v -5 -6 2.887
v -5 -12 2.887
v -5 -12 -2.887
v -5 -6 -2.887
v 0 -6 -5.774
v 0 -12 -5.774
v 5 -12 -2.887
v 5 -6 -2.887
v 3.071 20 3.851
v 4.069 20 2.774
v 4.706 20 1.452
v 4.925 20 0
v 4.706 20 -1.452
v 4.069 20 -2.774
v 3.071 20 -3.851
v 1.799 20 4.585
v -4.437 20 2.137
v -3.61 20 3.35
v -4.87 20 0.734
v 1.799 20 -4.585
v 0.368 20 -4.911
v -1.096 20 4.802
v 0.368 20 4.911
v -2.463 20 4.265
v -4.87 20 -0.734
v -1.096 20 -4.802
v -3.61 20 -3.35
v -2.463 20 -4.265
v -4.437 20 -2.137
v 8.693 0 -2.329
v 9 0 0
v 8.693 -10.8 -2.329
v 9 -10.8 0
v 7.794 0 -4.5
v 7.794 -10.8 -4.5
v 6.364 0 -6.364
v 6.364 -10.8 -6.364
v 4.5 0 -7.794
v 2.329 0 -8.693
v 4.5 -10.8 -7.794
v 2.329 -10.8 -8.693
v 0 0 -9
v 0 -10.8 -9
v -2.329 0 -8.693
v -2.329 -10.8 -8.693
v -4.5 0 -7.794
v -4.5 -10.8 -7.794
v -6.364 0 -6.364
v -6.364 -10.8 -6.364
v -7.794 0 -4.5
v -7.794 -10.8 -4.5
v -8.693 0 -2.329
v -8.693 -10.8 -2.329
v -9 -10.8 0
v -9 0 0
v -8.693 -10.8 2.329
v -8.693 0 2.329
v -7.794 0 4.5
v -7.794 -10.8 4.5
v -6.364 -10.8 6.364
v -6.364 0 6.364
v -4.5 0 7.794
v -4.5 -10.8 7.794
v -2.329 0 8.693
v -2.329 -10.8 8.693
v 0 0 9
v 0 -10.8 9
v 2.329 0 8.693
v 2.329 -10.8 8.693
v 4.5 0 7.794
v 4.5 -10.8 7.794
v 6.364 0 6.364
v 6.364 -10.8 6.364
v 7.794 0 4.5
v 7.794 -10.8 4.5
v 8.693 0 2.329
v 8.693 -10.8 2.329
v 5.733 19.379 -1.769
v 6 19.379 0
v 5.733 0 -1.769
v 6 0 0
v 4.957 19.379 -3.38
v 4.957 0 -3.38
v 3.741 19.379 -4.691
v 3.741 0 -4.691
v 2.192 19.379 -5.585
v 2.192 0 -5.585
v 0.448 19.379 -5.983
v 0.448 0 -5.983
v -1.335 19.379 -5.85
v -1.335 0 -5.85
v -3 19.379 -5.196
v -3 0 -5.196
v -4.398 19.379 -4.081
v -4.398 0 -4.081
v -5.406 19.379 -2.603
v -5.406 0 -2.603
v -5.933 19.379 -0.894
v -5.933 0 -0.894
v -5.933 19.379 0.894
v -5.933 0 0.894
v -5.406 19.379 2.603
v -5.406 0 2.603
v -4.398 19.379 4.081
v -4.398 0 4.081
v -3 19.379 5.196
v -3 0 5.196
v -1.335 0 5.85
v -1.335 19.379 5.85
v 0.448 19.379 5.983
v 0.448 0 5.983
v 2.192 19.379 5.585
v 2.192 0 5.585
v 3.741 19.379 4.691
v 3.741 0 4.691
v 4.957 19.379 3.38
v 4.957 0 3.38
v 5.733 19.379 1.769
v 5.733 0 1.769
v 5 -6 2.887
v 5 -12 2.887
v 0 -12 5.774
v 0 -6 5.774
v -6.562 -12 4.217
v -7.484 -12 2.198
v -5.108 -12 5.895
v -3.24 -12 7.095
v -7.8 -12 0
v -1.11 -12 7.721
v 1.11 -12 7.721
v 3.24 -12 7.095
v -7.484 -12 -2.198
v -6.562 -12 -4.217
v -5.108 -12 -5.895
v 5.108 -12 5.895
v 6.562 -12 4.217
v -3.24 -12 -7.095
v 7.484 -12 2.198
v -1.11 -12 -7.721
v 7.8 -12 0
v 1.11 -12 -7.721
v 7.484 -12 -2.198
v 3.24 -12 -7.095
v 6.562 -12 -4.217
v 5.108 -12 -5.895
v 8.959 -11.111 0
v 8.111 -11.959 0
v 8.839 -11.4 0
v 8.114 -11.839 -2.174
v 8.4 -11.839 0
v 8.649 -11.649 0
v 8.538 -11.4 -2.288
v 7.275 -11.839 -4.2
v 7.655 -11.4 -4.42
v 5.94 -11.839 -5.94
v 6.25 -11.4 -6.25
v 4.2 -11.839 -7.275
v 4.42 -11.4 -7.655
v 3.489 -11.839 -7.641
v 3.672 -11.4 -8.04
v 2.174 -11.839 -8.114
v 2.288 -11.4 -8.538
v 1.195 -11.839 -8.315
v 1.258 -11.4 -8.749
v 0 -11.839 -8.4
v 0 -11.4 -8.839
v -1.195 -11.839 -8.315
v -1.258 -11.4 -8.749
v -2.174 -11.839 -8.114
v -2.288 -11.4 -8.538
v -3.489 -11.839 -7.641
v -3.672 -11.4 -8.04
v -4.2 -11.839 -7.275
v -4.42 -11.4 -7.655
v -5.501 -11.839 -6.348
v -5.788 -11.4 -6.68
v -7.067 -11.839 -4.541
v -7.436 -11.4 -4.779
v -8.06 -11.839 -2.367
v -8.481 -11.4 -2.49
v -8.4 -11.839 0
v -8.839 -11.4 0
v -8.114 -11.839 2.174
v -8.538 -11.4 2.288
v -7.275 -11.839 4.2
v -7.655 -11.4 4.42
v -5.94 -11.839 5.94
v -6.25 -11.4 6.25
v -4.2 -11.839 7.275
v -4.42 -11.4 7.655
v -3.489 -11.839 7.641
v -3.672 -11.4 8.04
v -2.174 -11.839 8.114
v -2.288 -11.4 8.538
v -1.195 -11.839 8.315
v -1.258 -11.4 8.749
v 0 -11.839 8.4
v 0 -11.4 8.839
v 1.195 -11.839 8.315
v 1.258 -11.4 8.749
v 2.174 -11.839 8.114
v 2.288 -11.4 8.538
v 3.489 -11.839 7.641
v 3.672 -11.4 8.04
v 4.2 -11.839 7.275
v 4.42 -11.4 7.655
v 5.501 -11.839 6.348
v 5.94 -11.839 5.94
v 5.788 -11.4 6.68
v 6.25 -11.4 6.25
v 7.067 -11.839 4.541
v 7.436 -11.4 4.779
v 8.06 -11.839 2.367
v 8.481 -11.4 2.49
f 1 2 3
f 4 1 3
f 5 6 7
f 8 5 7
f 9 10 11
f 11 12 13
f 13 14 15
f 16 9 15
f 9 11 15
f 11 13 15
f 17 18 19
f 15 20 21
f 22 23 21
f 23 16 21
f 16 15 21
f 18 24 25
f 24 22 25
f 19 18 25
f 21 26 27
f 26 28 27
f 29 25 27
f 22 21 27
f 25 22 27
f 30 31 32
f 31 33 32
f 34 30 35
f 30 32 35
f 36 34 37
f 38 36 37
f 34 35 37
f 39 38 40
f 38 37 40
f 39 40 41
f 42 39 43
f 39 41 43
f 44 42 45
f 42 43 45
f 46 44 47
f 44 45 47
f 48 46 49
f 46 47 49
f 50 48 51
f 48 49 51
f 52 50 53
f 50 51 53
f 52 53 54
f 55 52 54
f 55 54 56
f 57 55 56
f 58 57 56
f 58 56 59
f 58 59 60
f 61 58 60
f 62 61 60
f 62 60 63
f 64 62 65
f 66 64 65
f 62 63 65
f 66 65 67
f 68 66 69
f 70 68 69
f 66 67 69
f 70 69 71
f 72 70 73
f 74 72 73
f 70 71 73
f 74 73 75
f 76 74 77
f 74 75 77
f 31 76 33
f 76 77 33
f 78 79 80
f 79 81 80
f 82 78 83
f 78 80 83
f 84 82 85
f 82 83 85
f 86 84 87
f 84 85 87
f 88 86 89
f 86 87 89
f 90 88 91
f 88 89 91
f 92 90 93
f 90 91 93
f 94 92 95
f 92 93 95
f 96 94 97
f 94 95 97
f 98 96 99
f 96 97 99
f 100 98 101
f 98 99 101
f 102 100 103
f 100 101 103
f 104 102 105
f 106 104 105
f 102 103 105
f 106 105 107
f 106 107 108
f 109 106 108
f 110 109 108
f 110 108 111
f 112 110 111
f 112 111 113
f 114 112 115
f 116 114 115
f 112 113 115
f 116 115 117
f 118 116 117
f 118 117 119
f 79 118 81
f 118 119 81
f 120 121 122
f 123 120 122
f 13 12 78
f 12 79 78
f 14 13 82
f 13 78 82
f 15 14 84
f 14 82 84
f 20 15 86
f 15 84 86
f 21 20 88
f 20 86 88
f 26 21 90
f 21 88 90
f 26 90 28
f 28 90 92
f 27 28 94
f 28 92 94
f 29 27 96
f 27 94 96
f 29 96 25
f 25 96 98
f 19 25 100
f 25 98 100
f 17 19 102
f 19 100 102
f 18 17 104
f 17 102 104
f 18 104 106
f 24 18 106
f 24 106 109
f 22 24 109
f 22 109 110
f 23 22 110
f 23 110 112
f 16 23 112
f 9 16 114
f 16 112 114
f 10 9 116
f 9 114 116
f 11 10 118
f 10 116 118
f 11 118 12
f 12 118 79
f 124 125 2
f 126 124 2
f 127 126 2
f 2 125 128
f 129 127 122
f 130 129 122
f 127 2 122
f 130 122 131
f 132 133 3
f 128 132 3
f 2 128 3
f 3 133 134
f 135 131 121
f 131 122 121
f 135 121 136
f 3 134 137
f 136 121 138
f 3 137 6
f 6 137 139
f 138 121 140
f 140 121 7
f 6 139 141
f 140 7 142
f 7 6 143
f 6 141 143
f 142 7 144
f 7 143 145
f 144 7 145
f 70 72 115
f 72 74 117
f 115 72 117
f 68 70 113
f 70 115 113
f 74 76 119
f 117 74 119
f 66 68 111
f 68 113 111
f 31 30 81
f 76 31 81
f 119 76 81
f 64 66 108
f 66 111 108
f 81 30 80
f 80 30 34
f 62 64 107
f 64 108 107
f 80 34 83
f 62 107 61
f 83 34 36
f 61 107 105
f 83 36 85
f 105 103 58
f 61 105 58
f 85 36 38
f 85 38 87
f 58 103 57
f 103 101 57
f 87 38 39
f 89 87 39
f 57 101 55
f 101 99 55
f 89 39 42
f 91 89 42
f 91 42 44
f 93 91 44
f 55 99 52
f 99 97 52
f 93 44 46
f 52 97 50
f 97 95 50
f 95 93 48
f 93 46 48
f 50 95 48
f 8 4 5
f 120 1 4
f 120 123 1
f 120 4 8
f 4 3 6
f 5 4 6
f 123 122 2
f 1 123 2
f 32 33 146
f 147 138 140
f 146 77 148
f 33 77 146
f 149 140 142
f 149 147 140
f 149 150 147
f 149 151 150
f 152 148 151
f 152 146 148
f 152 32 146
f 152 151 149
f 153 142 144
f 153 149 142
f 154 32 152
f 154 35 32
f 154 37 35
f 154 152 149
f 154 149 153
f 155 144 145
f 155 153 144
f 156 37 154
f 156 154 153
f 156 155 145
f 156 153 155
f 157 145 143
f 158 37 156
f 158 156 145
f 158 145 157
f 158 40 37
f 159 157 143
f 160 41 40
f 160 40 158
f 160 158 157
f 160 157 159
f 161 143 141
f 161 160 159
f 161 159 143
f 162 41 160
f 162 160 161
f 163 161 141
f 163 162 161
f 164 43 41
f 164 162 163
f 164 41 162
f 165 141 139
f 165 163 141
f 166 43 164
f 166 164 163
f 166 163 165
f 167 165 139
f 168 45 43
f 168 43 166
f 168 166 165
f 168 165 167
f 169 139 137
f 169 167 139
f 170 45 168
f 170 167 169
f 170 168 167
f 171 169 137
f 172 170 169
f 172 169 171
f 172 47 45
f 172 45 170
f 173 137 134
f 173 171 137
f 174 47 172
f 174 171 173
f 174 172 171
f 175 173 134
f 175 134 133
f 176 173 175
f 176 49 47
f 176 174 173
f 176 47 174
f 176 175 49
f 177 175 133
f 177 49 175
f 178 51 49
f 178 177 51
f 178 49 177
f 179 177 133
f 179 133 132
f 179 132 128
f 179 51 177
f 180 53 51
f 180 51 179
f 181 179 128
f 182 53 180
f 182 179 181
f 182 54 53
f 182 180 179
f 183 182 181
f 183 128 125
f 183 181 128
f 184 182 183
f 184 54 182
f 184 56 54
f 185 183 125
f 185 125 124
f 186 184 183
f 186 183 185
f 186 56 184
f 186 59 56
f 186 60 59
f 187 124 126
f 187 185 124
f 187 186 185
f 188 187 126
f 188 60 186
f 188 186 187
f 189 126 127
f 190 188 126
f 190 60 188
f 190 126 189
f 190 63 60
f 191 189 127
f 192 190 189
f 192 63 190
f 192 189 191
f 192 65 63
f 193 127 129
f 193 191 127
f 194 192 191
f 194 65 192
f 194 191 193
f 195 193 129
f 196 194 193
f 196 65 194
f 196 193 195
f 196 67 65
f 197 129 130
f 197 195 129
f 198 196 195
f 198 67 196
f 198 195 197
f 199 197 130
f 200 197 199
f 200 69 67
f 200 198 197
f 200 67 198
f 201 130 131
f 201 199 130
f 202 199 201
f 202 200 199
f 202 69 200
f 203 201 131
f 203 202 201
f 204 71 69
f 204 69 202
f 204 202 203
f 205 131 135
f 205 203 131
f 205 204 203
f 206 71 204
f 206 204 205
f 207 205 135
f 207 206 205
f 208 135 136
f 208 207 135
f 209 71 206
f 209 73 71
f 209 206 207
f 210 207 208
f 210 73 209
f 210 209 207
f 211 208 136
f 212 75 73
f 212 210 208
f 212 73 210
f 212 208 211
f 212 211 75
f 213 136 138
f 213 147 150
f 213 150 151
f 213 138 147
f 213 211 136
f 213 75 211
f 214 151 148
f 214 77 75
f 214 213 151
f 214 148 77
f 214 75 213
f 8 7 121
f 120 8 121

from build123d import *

# Parameters (mm, degrees)
POCKET_DEPTH = 6


with BuildPart() as part:
    # Sketch → Revolution (revolve)
    with BuildSketch(Plane.XY):
        with BuildLine():
            Line((6, 0), (9, 0))
            Line((9, 0), (9, -10.8))
            ThreePointArc((7.8, -12), (8.648528, -11.648528), (9, -10.8))
            Line((7.8, -12), (0, -12))
            Line((0, -12), (0, 20))
            Line((0, 20), (4.925, 20))
            Line((4.925, 20), (6, 19.379348))
            Line((6, 19.379348), (6, 0))
        make_face()
    revolve(axis=Axis((0, 0, 0), (0, 1, 0)))

    # Sketch001 → Pocket (cut)
    with BuildSketch(Plane.XZ.offset(12)):
        Polygon((-5, 2.886751), (-5, -2.886751), (0, -5.773503), (5, -2.886751), (5, 2.886751), (0, 5.773503), align=None)
    extrude(amount=-POCKET_DEPTH, mode=Mode.SUBTRACT)


solid = part.part
